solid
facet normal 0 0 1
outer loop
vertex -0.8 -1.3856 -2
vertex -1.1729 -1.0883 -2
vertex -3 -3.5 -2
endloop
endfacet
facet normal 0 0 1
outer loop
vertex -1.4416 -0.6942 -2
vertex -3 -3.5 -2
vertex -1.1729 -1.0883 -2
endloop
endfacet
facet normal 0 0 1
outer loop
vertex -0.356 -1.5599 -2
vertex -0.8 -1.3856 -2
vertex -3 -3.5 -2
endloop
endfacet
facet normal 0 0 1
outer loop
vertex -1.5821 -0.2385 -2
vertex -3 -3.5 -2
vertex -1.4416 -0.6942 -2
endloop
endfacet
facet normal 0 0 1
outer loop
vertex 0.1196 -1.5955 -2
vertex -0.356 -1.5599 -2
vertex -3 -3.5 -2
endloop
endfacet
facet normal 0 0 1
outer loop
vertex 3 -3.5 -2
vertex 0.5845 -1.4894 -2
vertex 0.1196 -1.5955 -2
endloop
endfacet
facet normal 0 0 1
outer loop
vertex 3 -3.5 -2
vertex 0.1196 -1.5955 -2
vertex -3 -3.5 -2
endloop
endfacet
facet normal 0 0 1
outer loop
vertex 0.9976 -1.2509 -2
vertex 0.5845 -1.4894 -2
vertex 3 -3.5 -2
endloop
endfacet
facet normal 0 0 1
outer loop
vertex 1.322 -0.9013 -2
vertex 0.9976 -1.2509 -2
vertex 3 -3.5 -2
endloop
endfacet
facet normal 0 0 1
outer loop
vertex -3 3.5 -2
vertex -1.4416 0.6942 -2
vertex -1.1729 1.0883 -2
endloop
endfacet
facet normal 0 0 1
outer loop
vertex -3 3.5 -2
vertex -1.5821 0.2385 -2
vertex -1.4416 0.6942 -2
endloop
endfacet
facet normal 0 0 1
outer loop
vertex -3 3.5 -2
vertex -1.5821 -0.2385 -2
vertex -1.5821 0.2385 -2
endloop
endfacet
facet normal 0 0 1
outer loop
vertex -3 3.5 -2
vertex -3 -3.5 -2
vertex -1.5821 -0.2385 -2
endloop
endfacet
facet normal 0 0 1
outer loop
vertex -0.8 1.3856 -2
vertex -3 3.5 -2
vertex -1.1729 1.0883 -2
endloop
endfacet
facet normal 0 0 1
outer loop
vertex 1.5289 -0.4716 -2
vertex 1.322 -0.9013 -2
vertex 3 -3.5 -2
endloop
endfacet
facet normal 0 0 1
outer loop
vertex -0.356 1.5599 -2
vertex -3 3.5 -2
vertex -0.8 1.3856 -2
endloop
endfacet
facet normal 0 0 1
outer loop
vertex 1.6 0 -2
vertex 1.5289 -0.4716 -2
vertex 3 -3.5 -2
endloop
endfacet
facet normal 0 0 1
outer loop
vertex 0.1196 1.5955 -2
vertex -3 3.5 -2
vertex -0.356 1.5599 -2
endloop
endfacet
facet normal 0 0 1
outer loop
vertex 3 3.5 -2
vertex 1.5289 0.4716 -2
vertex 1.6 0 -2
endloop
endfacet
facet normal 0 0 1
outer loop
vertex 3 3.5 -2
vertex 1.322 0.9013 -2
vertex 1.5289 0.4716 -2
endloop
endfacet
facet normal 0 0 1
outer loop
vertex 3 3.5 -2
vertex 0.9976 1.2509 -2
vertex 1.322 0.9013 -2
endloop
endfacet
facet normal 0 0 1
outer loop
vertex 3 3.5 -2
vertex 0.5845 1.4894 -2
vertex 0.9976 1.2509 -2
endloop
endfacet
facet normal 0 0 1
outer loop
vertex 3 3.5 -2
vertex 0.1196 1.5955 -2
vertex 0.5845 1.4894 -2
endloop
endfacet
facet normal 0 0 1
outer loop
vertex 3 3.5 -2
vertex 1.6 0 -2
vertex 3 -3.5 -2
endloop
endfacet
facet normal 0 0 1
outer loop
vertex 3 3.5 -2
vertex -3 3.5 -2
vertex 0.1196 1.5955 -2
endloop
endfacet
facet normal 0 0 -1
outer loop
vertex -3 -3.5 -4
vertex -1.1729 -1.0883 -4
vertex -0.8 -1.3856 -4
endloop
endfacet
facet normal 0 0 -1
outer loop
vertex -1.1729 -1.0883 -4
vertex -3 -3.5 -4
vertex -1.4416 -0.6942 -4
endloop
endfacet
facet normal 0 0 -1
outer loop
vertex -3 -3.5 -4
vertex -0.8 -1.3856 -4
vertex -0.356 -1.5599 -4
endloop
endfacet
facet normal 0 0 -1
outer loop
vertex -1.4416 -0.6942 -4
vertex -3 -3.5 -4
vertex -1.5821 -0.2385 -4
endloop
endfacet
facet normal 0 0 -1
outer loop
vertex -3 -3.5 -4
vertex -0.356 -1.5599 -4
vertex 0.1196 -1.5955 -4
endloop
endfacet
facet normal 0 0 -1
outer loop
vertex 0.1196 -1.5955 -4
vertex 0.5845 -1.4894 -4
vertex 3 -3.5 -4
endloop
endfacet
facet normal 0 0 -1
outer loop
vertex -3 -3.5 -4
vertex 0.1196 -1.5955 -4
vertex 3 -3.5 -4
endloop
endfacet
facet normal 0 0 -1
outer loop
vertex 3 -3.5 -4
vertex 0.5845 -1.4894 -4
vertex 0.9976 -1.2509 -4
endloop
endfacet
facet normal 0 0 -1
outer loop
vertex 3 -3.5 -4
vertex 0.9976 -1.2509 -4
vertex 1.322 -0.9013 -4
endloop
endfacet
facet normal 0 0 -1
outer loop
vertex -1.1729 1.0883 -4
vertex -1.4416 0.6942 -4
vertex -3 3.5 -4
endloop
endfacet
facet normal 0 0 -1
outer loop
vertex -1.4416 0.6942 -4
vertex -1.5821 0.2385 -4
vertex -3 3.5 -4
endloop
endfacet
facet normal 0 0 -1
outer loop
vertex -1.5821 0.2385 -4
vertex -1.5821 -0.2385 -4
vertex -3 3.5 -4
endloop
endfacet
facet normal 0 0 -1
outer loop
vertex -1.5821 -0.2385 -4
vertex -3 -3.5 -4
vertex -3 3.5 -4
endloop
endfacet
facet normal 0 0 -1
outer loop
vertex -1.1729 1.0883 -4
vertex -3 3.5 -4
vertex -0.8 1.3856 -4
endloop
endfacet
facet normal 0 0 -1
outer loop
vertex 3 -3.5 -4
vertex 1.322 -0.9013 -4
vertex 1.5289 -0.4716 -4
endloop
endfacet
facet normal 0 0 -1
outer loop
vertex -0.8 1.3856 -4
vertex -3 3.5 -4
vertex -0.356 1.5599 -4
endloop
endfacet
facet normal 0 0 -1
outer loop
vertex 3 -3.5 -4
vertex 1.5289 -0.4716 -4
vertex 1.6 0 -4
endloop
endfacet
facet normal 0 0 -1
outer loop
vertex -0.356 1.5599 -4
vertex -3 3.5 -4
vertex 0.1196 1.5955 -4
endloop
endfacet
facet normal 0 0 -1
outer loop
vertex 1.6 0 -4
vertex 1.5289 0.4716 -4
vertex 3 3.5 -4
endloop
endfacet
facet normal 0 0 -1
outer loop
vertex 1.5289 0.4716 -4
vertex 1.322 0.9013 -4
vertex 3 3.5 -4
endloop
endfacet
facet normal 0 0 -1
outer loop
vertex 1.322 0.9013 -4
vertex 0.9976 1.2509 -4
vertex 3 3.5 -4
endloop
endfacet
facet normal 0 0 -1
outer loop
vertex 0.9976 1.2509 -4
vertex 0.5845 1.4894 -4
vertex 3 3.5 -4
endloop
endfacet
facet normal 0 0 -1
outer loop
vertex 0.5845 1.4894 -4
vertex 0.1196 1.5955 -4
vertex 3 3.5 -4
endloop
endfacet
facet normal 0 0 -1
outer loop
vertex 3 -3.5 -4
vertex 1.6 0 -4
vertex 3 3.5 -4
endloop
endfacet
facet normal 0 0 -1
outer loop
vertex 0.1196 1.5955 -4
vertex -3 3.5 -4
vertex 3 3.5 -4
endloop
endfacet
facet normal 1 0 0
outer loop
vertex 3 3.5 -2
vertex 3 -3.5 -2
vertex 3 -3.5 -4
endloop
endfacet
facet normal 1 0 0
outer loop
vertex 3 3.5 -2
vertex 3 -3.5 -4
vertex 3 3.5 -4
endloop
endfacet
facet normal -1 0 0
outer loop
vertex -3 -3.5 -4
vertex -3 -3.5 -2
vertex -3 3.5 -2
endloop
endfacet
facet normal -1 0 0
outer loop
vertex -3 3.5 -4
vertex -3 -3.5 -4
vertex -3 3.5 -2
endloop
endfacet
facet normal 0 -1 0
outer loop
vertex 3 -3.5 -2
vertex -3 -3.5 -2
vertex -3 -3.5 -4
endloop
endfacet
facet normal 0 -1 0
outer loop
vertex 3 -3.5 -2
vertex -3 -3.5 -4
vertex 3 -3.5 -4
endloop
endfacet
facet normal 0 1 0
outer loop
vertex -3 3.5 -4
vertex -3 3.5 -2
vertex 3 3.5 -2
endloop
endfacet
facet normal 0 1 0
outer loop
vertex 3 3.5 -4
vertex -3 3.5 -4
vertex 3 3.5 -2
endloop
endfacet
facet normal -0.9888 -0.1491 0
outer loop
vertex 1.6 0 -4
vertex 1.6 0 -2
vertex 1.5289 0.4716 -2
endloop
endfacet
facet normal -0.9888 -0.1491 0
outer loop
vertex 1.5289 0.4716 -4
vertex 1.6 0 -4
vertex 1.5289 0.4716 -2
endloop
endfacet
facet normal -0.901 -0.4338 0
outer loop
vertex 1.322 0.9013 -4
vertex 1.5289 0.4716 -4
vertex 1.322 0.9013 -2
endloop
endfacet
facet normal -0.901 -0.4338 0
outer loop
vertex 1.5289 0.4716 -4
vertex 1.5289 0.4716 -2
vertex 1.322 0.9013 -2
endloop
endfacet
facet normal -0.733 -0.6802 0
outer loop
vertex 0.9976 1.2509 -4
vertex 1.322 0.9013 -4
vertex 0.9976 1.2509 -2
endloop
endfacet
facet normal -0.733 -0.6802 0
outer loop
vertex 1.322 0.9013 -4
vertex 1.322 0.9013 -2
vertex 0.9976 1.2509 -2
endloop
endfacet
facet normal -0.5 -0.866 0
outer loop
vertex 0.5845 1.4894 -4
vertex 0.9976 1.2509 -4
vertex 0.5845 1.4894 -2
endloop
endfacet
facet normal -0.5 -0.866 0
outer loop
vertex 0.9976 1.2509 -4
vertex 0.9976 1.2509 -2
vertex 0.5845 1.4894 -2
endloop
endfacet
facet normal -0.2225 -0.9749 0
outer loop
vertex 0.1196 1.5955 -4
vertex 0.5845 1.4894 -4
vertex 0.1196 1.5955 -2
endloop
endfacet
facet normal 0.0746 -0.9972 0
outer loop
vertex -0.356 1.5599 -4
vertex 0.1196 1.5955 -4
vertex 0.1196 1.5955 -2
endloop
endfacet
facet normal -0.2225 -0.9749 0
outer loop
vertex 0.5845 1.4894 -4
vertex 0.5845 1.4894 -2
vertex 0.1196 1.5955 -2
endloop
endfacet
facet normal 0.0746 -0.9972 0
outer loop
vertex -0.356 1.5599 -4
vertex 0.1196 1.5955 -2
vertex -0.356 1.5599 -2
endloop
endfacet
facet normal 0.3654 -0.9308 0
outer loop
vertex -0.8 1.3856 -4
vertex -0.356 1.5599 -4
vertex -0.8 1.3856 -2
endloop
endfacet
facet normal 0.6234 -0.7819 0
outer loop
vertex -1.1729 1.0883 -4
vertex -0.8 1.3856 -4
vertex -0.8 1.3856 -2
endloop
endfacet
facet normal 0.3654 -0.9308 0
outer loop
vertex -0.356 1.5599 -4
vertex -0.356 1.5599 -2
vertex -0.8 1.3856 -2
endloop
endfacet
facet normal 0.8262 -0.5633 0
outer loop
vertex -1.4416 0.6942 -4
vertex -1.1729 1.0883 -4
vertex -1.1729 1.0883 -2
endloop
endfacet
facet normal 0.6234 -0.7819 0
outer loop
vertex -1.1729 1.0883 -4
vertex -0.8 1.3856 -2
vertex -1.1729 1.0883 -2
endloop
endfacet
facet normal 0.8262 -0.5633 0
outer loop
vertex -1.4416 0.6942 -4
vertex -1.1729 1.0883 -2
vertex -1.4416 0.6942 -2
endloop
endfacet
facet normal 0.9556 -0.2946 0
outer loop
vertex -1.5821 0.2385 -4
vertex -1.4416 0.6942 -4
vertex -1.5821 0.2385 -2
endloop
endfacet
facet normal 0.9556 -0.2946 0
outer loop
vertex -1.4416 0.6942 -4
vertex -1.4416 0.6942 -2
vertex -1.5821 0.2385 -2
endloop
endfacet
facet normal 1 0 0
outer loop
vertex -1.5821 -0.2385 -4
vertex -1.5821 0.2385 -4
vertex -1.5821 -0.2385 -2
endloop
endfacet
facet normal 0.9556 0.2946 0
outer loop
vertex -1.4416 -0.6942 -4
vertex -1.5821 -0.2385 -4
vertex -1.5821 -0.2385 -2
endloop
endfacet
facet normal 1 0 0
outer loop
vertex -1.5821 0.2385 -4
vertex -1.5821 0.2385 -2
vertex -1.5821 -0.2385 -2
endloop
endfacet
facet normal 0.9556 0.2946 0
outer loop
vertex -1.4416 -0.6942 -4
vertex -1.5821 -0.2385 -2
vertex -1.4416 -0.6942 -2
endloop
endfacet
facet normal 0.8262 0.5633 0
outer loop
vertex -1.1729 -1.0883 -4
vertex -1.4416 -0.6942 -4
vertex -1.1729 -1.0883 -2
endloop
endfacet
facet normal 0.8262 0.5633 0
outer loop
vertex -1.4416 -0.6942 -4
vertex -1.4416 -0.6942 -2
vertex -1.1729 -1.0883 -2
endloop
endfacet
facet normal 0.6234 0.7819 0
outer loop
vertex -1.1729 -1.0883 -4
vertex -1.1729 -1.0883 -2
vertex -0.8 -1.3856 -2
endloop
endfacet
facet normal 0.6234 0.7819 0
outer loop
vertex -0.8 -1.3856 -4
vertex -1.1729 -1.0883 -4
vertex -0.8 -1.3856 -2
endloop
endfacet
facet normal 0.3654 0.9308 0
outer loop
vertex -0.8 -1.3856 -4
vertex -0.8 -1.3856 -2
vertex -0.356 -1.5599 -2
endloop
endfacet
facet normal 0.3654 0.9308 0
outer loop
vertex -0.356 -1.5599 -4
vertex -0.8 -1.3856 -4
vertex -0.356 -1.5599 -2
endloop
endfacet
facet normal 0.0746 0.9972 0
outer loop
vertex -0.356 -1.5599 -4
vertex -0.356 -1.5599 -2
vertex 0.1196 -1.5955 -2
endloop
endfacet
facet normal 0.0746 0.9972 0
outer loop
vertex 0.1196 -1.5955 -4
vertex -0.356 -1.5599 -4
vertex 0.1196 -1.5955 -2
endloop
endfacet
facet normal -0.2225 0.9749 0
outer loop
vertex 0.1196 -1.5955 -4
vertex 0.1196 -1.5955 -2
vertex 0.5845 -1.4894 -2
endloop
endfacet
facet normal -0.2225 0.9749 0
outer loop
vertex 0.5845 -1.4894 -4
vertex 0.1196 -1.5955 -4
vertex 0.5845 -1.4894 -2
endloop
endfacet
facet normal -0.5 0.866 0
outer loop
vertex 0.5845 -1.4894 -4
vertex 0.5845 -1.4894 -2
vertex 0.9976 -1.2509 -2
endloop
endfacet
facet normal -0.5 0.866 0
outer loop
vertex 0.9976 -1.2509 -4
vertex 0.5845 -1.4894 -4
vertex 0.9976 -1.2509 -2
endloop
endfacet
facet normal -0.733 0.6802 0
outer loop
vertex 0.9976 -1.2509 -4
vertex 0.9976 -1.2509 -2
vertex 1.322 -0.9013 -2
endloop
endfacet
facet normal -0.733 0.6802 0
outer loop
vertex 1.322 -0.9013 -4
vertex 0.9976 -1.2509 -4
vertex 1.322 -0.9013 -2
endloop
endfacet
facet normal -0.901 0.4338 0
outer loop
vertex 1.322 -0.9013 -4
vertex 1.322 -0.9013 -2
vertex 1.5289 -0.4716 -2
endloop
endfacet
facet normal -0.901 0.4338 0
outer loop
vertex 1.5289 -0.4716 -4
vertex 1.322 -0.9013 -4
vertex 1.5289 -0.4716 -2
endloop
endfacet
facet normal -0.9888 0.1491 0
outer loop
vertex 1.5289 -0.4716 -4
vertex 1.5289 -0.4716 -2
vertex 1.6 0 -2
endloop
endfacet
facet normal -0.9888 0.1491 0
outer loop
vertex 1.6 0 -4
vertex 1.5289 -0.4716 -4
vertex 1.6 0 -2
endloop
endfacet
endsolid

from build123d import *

# Parameters (mm, degrees)
F0_W     = 6
F0_H     = 7
F0_R     = 1.6
F1_DEPTH = 4
F2_DEPTH = 2


# Not quite as in the source:
# - a feature names something its author has since deleted; it is built from what else it names


with BuildPart() as f1:
    # F0 (on Top) → F1 (new body)
    with BuildSketch(Plane.XY):
        Rectangle(F0_W, F0_H)
        Circle(F0_R, mode=Mode.SUBTRACT)
    extrude(amount=-F1_DEPTH)

    # F0 (on Top) → F2 (cut)
    with BuildSketch(Plane.XY):
        Rectangle(F0_W, F0_H)
        Circle(F0_R, mode=Mode.SUBTRACT)
    extrude(amount=-F2_DEPTH, mode=Mode.SUBTRACT)


solid = f1.part
